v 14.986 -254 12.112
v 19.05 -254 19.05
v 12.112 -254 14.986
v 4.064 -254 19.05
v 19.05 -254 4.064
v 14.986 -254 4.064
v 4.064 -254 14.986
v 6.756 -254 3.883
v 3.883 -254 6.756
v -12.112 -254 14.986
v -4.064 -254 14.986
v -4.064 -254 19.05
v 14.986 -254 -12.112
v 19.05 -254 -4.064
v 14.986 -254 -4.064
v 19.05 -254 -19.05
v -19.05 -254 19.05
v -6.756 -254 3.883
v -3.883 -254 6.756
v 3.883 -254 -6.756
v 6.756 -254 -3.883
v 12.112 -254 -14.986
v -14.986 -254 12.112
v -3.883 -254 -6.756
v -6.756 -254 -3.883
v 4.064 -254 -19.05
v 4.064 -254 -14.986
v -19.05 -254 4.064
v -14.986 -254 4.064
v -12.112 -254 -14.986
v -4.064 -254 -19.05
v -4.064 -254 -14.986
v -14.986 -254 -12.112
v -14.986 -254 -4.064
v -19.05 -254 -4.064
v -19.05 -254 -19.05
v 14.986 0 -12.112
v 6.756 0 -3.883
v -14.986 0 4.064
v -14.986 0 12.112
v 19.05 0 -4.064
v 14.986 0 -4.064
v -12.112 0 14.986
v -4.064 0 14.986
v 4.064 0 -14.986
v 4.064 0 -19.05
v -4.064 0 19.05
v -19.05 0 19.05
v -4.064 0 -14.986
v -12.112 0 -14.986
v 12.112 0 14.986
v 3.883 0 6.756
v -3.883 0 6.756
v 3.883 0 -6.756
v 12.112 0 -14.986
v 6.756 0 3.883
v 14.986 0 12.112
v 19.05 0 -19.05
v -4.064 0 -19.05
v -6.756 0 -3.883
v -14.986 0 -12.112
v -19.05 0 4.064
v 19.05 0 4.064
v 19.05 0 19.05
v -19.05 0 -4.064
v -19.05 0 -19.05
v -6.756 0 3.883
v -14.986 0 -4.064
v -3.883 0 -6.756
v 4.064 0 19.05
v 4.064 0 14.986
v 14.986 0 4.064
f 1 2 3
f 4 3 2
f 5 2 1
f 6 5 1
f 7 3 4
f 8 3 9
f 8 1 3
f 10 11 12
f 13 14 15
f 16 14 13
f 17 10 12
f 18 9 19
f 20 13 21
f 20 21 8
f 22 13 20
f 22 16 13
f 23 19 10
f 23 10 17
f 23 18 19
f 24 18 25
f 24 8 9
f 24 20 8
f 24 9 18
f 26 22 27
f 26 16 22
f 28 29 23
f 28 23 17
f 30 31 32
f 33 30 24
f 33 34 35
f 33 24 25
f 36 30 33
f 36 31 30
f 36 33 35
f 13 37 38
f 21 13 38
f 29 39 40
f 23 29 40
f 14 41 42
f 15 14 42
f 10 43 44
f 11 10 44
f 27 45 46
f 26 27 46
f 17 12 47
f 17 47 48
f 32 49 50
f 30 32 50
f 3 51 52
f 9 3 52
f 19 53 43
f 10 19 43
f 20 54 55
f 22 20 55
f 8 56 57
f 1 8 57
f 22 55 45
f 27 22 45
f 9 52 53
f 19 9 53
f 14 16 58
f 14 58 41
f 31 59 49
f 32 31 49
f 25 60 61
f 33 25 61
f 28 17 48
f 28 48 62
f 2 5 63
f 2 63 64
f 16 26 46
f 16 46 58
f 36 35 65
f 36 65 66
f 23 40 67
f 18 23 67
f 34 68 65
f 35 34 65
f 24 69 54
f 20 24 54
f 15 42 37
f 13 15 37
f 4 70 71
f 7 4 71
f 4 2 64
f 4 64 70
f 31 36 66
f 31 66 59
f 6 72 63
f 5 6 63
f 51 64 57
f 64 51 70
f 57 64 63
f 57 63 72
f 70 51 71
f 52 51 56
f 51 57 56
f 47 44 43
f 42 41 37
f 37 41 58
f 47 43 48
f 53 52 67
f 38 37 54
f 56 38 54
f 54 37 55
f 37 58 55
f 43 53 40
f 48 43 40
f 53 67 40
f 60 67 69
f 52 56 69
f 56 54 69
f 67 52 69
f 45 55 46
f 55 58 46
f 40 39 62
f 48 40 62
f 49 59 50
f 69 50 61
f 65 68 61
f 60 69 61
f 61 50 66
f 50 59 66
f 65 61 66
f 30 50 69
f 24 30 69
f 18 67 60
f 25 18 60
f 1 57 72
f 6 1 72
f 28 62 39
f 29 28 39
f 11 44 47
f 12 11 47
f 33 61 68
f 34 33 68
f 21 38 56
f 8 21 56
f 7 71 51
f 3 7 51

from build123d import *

# Parameters (mm, degrees)
BOSS_EXTRUDE1_DEPTH = 254


with BuildPart() as part:
    # Sketch2 → Boss-Extrude1 (new body)
    with BuildSketch(Plane(origin=(0, 0, 0), x_dir=(1, 0, 0), z_dir=(0, 1, 0))):
        Polygon((-19.05, 19.05), (-4.064, 19.05), (-4.064, 14.986), (-12.112318041, 14.986), (-3.882718041, 6.7564), (3.882718041, 6.7564), (12.112318041, 14.986), (4.064, 14.986), (4.064, 19.05), (19.05, 19.05), (19.05, 4.064), (14.986, 4.064), (14.986, 12.112318041), (6.7564, 3.882718041), (6.7564, -3.882718041), (14.986, -12.112318041), (14.986, -4.064), (19.05, -4.064), (19.05, -19.05), (4.064, -19.05), (4.064, -14.986), (12.112318041, -14.986), (3.882718041, -6.7564), (-3.882718041, -6.7564), (-12.112318041, -14.986), (-4.064, -14.986), (-4.064, -19.05), (-19.05, -19.05), (-19.05, -4.064), (-14.986, -4.064), (-14.986, -12.112318041), (-6.7564, -3.882718041), (-6.7564, 3.882718041), (-14.986, 12.112318041), (-14.986, 4.064), (-19.05, 4.064), align=None)
    extrude(amount=-BOSS_EXTRUDE1_DEPTH)


solid = part.part
